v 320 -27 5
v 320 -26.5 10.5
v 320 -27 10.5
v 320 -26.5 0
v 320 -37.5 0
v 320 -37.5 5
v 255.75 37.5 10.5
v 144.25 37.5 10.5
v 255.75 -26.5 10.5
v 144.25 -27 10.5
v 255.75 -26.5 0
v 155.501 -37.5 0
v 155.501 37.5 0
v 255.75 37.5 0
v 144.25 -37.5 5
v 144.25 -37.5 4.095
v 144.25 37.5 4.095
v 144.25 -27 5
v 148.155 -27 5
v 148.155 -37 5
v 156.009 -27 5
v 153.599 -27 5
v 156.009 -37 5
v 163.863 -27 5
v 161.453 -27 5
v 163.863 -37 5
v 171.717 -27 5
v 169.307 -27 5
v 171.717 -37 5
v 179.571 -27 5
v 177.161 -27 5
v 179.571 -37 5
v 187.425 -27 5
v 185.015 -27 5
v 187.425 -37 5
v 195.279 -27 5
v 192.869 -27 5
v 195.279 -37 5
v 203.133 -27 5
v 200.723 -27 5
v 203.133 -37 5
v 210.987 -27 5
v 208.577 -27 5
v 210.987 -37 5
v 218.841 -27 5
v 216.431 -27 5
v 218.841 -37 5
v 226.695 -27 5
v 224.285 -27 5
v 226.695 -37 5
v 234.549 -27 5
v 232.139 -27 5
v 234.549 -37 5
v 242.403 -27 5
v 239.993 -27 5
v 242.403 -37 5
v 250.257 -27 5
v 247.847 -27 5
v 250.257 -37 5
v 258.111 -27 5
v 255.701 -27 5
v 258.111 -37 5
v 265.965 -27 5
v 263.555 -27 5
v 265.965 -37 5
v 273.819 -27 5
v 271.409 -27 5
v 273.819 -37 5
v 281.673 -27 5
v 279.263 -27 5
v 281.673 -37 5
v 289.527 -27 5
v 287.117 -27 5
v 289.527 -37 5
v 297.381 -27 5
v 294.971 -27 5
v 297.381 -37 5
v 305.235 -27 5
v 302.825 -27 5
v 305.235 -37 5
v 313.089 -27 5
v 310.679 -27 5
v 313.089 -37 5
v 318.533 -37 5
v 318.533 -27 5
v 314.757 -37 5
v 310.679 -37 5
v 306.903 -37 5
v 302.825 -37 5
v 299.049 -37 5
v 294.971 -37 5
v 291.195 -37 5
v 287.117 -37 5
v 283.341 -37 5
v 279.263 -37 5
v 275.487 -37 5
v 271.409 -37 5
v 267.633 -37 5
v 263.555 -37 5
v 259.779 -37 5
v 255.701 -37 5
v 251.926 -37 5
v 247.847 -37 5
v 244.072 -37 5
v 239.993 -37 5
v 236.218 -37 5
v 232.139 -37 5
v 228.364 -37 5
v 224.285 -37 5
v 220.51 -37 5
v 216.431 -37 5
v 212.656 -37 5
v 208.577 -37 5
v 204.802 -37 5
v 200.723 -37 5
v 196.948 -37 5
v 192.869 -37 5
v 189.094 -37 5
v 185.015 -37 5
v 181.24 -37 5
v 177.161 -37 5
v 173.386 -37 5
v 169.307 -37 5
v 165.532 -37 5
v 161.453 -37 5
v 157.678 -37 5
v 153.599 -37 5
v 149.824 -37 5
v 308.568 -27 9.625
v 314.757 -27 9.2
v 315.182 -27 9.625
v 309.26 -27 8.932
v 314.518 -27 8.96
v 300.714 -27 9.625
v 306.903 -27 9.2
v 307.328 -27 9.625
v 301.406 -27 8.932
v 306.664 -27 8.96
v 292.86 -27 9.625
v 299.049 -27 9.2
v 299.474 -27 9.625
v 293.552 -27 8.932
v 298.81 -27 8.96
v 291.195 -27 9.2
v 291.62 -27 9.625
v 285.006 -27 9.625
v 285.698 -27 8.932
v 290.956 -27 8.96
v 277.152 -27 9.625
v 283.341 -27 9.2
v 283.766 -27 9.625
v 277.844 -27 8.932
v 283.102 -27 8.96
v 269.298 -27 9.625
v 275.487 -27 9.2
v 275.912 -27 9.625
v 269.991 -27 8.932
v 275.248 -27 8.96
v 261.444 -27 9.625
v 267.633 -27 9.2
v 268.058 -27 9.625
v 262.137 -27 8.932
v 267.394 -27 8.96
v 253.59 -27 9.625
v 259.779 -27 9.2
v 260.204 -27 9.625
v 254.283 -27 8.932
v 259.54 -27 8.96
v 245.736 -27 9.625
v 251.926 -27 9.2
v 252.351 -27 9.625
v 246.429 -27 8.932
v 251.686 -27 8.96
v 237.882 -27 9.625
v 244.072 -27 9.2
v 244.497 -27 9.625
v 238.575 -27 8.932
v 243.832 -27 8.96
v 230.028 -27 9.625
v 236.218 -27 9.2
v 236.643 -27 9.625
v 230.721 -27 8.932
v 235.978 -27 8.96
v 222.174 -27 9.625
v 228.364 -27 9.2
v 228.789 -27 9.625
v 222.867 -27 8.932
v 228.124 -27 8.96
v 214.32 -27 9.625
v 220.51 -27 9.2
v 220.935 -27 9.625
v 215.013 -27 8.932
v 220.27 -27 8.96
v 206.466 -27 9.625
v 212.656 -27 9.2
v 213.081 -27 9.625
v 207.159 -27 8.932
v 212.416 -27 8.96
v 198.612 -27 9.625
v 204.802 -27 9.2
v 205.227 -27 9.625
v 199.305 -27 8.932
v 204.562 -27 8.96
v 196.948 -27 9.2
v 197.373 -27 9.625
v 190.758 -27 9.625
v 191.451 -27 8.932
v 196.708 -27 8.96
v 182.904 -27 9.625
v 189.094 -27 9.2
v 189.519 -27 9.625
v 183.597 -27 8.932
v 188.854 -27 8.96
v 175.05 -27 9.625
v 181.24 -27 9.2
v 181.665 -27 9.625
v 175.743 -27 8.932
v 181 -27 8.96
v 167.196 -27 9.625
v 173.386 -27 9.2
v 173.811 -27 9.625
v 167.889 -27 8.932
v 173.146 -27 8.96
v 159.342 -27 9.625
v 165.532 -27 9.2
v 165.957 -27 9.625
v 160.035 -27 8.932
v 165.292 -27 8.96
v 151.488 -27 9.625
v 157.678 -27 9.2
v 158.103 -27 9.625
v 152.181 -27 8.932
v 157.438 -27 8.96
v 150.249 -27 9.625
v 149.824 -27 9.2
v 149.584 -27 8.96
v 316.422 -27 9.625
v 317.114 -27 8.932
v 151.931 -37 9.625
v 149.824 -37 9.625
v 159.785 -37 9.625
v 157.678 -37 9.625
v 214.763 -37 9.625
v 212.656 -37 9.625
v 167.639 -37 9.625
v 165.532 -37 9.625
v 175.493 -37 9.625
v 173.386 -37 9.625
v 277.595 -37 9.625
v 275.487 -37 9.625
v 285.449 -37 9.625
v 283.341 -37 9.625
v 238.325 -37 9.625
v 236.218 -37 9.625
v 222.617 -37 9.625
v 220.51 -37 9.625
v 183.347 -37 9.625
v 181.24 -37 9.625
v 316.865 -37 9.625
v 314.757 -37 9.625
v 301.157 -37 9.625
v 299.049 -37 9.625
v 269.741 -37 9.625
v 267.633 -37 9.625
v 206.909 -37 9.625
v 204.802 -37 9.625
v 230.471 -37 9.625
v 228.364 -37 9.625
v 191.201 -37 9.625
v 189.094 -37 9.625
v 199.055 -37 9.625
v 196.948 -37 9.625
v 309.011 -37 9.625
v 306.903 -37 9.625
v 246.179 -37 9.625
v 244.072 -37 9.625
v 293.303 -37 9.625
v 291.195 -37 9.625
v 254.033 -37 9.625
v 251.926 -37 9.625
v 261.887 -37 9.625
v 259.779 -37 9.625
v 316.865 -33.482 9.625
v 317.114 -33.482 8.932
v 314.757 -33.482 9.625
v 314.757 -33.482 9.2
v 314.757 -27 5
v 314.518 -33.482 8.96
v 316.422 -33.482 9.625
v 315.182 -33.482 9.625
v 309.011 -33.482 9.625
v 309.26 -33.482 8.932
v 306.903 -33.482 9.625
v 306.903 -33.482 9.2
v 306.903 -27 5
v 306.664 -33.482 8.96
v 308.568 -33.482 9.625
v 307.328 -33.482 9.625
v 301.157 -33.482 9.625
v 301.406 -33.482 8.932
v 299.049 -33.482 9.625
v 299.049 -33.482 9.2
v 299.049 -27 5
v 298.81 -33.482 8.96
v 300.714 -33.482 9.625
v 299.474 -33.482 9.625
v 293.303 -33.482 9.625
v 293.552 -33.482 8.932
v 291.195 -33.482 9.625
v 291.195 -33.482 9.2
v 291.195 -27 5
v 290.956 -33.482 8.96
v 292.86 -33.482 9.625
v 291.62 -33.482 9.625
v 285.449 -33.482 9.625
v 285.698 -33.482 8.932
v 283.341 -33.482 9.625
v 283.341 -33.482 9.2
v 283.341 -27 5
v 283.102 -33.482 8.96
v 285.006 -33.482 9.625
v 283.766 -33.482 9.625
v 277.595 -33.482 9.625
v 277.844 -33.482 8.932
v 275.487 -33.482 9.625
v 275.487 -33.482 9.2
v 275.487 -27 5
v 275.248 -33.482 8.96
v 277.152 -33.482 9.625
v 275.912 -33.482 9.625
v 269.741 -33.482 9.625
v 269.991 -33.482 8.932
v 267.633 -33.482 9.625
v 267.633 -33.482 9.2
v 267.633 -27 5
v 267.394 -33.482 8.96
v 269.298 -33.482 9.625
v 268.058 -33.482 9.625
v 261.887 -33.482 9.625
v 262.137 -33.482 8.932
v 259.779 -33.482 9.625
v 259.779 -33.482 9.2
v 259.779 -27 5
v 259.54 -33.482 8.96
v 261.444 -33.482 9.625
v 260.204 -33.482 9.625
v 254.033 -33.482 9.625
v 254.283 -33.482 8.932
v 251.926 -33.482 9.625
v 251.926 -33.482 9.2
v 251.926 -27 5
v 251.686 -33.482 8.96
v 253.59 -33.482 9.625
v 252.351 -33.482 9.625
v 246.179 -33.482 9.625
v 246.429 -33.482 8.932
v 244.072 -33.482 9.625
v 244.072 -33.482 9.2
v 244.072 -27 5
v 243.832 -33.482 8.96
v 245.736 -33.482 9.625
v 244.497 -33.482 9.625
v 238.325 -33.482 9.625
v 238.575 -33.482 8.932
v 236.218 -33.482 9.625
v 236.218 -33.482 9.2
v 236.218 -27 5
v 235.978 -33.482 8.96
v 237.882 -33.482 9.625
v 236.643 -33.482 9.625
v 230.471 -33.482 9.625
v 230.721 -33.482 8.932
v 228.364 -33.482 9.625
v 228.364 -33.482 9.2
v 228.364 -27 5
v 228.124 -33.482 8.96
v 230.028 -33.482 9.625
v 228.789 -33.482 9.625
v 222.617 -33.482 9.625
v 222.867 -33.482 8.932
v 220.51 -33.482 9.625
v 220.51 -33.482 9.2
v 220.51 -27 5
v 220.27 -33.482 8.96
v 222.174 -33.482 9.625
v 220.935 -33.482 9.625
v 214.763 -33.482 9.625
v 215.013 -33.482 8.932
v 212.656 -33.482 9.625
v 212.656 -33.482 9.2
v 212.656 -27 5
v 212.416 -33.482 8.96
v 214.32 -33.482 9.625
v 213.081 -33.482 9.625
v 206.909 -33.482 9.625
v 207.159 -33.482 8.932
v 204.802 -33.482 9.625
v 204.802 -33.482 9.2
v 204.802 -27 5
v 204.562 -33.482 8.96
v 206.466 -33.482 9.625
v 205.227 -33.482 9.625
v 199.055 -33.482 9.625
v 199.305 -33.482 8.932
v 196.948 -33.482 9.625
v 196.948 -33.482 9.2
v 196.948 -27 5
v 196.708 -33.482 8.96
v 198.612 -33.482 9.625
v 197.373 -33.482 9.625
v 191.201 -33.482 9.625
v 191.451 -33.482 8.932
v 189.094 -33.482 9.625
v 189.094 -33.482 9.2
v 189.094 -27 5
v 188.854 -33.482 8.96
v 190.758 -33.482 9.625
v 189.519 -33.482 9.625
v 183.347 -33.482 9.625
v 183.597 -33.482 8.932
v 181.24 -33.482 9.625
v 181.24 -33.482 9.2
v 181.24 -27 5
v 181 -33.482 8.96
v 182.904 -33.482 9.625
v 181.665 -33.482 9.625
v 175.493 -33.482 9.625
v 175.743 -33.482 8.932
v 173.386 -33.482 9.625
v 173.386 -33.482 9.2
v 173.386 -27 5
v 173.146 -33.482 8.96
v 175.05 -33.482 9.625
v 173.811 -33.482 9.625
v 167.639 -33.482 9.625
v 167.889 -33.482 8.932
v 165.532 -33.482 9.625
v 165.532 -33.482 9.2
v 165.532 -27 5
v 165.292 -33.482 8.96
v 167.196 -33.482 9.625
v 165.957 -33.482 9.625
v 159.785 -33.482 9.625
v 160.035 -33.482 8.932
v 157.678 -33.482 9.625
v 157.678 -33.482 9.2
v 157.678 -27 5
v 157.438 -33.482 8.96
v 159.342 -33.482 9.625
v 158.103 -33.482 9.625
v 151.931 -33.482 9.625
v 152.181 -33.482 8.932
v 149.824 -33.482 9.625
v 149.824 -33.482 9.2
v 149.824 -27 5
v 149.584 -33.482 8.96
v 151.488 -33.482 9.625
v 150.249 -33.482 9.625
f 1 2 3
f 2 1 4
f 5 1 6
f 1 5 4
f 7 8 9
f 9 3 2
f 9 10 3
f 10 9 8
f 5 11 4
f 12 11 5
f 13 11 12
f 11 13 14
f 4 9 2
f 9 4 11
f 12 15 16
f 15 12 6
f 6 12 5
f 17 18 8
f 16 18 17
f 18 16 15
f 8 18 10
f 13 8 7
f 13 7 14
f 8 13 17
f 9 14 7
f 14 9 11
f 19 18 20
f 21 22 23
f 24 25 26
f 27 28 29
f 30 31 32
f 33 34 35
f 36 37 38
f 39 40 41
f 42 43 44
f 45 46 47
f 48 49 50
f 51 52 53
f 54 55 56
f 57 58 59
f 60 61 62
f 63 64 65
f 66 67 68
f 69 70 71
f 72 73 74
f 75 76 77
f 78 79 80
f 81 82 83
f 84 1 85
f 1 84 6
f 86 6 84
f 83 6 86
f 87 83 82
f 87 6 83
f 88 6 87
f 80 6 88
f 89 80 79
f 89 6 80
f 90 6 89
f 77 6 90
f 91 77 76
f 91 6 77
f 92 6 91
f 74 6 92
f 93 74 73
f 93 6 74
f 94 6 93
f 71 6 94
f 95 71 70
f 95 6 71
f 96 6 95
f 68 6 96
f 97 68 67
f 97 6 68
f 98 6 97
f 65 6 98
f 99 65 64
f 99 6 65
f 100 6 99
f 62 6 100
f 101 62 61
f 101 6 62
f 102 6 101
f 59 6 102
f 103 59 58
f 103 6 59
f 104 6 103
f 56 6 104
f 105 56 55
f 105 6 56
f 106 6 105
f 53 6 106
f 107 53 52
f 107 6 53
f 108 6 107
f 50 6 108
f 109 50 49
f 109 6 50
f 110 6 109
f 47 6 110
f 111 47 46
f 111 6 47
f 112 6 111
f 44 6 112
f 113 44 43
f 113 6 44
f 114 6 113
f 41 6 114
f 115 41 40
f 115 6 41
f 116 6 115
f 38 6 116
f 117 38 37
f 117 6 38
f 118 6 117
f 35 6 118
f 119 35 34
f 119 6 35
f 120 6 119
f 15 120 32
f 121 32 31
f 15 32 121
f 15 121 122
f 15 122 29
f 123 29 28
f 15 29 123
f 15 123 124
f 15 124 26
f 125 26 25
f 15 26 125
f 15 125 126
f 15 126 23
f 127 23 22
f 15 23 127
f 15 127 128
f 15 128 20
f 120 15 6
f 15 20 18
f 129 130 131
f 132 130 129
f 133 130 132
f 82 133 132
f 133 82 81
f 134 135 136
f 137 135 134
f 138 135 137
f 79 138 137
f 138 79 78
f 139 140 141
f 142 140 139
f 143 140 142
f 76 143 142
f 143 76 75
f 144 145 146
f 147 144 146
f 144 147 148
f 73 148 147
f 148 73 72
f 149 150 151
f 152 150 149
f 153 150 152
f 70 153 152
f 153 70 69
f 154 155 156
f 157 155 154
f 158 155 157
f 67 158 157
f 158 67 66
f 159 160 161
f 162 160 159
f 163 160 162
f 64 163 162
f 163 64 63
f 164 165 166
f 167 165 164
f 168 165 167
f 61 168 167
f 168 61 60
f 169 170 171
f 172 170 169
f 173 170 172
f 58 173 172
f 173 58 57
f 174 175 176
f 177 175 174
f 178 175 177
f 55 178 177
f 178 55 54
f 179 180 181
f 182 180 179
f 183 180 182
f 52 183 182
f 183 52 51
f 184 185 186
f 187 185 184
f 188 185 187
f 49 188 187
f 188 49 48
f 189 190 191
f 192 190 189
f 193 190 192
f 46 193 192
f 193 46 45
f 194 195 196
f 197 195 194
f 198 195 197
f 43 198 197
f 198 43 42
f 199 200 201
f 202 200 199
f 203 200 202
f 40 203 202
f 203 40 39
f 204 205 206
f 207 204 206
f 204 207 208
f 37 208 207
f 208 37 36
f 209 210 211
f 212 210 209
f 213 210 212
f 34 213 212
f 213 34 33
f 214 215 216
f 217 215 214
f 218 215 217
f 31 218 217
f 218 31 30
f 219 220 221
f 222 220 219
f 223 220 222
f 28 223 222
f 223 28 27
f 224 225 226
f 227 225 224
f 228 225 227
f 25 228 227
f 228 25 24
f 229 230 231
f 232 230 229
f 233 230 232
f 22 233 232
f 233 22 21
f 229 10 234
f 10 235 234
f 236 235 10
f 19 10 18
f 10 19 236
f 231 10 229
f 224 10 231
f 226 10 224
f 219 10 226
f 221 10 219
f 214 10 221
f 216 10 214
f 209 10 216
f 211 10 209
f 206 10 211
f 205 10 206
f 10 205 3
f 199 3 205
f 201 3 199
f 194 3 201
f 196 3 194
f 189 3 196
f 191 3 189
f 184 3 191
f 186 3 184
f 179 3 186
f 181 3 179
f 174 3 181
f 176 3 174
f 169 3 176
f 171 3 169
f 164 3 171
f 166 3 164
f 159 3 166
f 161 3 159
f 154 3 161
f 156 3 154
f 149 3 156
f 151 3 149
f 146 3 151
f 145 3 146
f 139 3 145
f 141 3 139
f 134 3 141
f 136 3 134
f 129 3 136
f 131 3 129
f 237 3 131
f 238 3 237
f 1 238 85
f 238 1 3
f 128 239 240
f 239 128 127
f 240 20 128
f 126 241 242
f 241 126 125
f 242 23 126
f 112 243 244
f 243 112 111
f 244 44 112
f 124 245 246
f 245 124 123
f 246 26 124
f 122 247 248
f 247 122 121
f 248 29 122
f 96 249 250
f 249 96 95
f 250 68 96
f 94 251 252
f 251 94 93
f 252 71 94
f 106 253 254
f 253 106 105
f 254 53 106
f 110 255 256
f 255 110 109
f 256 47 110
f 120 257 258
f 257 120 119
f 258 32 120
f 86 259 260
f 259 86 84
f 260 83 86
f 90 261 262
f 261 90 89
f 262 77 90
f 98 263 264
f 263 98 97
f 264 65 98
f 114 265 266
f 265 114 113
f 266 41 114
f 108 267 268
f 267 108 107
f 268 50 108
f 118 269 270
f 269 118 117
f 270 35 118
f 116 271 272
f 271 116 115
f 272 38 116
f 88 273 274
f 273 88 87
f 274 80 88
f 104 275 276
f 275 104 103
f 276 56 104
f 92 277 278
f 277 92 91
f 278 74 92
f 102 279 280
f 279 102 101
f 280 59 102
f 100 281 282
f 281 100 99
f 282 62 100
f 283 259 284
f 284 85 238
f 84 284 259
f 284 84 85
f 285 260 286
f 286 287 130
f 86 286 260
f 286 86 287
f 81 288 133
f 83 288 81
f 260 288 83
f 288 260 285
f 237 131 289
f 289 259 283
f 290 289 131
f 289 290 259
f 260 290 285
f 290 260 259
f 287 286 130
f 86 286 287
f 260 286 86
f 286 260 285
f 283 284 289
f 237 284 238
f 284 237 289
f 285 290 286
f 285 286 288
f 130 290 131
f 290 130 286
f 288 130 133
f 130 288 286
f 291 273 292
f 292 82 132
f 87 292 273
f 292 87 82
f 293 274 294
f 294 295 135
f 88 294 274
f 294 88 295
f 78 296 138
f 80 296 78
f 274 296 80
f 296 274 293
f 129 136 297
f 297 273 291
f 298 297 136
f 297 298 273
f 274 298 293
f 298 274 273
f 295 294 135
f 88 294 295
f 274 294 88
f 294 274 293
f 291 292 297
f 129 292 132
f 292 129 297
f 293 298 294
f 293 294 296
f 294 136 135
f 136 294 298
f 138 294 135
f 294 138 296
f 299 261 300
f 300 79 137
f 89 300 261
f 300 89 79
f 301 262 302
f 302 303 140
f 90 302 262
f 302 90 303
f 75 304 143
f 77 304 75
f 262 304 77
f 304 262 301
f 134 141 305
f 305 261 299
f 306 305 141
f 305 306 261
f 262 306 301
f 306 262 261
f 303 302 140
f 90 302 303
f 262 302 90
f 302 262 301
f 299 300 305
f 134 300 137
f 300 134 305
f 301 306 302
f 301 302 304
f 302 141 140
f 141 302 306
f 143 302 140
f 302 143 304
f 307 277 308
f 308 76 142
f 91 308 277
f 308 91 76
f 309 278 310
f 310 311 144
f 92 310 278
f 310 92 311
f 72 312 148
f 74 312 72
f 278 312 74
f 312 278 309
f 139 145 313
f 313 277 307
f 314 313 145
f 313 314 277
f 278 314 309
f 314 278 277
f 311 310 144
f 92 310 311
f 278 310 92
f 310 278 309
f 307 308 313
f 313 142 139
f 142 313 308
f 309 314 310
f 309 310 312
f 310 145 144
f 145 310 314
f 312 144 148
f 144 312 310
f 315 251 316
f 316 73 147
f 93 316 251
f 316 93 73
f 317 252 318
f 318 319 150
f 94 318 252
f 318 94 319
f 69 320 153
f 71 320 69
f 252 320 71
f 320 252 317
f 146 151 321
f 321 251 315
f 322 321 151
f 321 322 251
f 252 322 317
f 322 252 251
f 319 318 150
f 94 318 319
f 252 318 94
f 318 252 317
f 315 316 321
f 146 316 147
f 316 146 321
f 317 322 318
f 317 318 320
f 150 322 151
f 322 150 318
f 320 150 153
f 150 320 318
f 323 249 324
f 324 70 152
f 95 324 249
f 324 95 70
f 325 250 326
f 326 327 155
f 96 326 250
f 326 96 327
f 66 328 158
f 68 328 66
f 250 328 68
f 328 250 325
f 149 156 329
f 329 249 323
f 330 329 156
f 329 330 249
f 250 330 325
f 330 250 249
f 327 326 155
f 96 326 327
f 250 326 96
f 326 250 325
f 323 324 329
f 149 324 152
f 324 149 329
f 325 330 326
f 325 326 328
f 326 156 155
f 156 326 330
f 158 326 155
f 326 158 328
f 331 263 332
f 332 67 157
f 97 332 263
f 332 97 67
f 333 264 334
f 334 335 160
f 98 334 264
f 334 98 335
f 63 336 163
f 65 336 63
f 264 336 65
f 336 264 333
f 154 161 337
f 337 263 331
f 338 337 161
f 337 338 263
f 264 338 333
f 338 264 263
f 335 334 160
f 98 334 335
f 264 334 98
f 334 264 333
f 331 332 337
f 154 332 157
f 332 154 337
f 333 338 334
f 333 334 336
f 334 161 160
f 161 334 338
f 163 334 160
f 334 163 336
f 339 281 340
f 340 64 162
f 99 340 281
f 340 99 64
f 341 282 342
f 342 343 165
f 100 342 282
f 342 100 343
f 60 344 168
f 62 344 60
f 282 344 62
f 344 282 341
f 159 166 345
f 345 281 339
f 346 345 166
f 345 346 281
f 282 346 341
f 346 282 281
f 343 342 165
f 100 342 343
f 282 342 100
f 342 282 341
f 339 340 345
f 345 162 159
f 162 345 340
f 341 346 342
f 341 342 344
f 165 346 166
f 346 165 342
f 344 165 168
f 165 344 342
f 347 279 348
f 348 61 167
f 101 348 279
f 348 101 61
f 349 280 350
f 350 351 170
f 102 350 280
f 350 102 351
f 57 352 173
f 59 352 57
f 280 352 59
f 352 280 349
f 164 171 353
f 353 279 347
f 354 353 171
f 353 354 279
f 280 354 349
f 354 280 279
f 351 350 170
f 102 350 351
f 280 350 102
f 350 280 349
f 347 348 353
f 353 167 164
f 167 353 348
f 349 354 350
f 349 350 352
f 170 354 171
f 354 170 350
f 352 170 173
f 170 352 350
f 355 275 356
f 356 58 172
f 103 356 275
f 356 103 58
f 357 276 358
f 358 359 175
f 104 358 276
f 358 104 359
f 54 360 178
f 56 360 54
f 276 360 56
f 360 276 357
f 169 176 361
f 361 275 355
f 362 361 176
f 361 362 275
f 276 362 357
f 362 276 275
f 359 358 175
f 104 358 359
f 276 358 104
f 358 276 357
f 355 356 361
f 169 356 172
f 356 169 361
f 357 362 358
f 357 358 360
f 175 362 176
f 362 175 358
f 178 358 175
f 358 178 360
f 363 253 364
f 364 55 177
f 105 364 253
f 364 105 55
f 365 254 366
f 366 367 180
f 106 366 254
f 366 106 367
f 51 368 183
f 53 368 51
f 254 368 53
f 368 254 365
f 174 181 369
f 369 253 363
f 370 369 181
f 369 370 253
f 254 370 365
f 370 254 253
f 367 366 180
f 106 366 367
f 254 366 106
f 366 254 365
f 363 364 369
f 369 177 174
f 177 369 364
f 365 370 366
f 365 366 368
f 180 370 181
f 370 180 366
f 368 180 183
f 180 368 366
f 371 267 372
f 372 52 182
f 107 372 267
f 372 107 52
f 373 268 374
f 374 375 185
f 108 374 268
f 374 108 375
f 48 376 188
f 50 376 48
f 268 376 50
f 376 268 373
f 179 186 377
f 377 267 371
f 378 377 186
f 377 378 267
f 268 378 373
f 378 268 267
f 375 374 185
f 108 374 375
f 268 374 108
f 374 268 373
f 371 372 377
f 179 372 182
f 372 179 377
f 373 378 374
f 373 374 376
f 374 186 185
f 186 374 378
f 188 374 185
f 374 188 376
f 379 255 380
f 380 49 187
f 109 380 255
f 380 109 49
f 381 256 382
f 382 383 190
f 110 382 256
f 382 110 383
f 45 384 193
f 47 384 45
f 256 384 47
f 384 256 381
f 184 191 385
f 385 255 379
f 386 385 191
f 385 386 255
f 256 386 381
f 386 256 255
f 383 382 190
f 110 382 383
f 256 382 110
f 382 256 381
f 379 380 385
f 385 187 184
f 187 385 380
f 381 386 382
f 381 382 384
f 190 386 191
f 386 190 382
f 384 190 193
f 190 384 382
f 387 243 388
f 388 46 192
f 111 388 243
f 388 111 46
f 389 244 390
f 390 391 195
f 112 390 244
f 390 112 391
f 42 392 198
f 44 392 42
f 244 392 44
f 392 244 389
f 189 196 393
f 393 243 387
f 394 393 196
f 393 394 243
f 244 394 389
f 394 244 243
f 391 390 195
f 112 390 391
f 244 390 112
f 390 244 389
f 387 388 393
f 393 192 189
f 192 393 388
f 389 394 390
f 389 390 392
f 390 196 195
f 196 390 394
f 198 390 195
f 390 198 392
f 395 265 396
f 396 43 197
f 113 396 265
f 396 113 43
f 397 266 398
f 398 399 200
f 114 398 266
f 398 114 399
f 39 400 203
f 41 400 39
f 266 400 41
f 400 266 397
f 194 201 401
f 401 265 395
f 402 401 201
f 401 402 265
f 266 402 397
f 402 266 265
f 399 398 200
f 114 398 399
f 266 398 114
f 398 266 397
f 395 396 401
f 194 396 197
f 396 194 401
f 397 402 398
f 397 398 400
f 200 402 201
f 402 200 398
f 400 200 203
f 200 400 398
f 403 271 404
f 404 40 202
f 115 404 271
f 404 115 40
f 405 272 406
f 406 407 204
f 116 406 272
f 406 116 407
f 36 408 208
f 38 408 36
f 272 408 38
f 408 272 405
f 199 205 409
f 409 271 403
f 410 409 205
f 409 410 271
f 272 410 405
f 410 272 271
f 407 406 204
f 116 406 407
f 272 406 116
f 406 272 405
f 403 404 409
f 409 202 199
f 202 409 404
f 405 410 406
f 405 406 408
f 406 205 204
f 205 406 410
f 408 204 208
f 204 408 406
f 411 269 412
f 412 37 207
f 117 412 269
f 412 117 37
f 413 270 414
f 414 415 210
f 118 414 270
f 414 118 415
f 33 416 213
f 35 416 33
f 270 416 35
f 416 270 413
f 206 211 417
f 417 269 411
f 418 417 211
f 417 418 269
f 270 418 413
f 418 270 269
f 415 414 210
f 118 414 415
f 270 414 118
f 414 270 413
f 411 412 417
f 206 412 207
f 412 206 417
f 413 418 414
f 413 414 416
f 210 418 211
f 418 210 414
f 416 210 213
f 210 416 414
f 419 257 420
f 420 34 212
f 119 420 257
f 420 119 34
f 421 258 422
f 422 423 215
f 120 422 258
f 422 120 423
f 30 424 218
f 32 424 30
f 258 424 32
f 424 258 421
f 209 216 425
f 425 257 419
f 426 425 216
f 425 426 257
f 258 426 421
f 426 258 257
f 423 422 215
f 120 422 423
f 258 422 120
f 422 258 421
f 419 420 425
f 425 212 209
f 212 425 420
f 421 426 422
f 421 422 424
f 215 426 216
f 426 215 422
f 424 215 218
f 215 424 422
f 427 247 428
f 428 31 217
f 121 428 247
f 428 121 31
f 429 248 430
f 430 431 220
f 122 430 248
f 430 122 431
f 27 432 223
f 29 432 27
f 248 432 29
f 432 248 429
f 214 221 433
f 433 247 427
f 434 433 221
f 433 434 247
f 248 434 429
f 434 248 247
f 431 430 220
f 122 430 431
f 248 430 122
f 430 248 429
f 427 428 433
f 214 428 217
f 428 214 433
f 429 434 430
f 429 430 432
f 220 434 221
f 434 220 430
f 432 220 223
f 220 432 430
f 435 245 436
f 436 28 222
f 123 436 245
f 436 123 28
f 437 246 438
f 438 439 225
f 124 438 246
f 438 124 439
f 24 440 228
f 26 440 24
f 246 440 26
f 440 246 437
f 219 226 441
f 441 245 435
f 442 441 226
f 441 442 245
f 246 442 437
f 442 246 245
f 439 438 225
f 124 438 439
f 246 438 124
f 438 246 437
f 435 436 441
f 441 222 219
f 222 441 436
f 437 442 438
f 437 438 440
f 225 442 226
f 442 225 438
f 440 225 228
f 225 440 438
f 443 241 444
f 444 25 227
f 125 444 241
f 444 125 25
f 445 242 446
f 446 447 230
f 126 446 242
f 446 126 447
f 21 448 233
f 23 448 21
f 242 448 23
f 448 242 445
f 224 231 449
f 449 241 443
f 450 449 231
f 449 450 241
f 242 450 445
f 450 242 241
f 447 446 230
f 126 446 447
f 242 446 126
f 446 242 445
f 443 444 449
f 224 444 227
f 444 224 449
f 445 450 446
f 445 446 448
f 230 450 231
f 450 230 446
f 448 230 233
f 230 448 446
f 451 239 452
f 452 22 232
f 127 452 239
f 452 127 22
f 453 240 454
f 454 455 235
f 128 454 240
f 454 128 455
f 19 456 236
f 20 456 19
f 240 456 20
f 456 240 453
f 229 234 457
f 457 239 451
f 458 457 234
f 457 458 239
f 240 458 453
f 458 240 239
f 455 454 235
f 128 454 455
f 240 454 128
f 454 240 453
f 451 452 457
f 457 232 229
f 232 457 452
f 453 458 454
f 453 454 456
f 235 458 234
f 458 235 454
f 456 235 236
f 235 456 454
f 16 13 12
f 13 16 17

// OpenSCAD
/*
   Copyright 2017 Alan Steremberg
*/
// configuration

$fn=100;

boxWidth=75;
boxHeight=75;
boxThickness=10.5;

coinDiameter = boxHeight;
coinThickness= boxThickness;
//pipeRadius = 24.25; // black pipe
//pipeRadius = 21.40; // clear pipe
//insidePipeRadius=20.8;
insidePipeRadius=coinDiameter/2+1;
wallThickness = 2.5;
screwDiameter = 4.8;
screwRadius=screwDiameter/2;
holeOffset = 35;
flangeWidth = 90;
flangeHeight= 130;
servoPusherHoleDiameter=1.75;




// BEFORE

pi = 3.1415926535897932384626433832795;
debug = false;

module tooth(mod,width) {
	// see http://easycalculation.com/trigonometry/triangle-angles.php
	opposite_at_reference_pitch=mod / tan(70);
	if (debug) echo("Opposite at reference pitch: ", opposite_at_reference_pitch);
	// see http://www.metrication.com/engineering/gears.html
	// see section Circular Tooth Thickness
	// see also http://www.tech.plym.ac.uk/sme/desnotes/gears/nomen1.htm
	tooth_width_at_reference_pitch=(pi / 2) * mod;
	if (debug) echo("Tooth width at reference_pitch: ", tooth_width_at_reference_pitch);
	cube_width = tooth_width_at_reference_pitch - (2 * opposite_at_reference_pitch);
	if (debug) echo("Cube width: ", cube_width);
	// see http://www.metrication.com/engineering/gears.html
	// see section Whole Depth
	opposite_of_triangle = mod < 1.25 ? 2.4 * mod : 2.25 * mod;
	if (debug) echo("Opposite_of_triangle: ", opposite_of_triangle);
	// see http://easycalculation.com/trigonometry/triangle-angles.php
	adjacent_of_triangle = opposite_of_triangle / tan(70);
	if (debug) echo("Adjacent of triangle: ", adjacent_of_triangle);
	diagonal = sqrt((opposite_of_triangle + 0.05) * (opposite_of_triangle + 0.05) + (adjacent_of_triangle * adjacent_of_triangle));
	correct_angle = 90 - acos(adjacent_of_triangle / diagonal);
	if (debug) echo("Correct angle: ", correct_angle);
	adjacent_of_mini_triangle = 0.05 / tan(90 - correct_angle);
	if (debug) echo("Adjacent of mini triangle: ", adjacent_of_mini_triangle);
	adjacent_top_cube = (0.5 * mod) / tan(45);
	translate([0,adjacent_of_mini_triangle * -1, 0]) {
		difference() {
			union() {
				intersection() {
					cube([opposite_of_triangle + 0.05,adjacent_of_triangle, width]);
					rotate([0,0,correct_angle]) cube([diagonal,adjacent_of_triangle, width]);
				}
				translate([0,adjacent_of_triangle,0]) cube([opposite_of_triangle + 0.05,cube_width, width]);
				translate([0,(adjacent_of_triangle * 2) + cube_width,width]) {
					rotate([180,0,0]) {
						intersection() {
							cube([opposite_of_triangle + 0.05,adjacent_of_triangle, width]);
							rotate([0,0,correct_angle]) cube([diagonal,adjacent_of_triangle, width]);
						}
					}
				}
			}
			translate([-0.5 * mod,-1,-0.5 * mod])cube([1 * mod + 0.05, 1+ adjacent_of_mini_triangle, width + (1 * mod)]);
			translate([-0.5 * mod,(adjacent_of_triangle * 2) + cube_width - adjacent_of_mini_triangle,-0.5 * mod]) cube([1 * mod + 0.05, 1, width + (1 * mod)]);
			translate([opposite_of_triangle + 0.05 * mod,adjacent_of_triangle - adjacent_top_cube,-0.25 * mod]) {
				rotate([0,0,45]) cube([1 * mod, 0.5 * mod,cube_width + (2 * mod)]);
			}
			translate([opposite_of_triangle + 0.05 * mod,adjacent_of_triangle - adjacent_top_cube + cube_width + 0.3 * mod,-0.25 * mod]) {
				rotate([0,0,45]) cube([0.5 * mod, 1 * mod,cube_width + (2 * mod)]);
			}
		}
	}
}

module teeth(mod,number_of_teeth,width) {
	union() {
		for (i= [0:number_of_teeth - 1]) {
			// see http://www.tech.plym.ac.uk/sme/desnotes/gears/nomen1.htm
			translate([-0.05,i * mod * pi,0]) {
				tooth(mod=mod,width=width);	
			}
		}
	}
}

module gear_rack(mod,number_of_teeth,rack_width,rack_bottom_height) {
	total_rack_length = number_of_teeth * pi * mod;
	rotate([0,90,0]) {
		translate([0,total_rack_length / 2 * -1,rack_width / 2 * -1]) {
			union() {
				teeth(mod=mod,number_of_teeth=number_of_teeth,width=rack_width);
				translate([rack_bottom_height * -1,0,0])
					cube([rack_bottom_height, number_of_teeth * pi * mod, rack_width]);
			}
		}
	}
	echo("Total length of gear rack (in mm): ", total_rack_length);
}


module holder(
   top_gap=4,
   side_gap=10,
   servo_width=20, 
   servo_length=42.5,
   gear_radius=17.8,
   servo_mount=4,
   rack_bottom_height=3.3,
   channel=9,
   tray_thickness=5.8
) {
    length=side_gap*2+servo_length;
    width=top_gap+servo_width/2+rack_bottom_height+gear_radius+tray_thickness;
    woffset=tray_thickness/2+rack_bottom_height/2;
difference(){
    
    cube([length, width, servo_mount],center=true);
    echo("woffset:",woffset);
    translate([0,woffset,0]) cube([servo_length,servo_width, servo_mount],center=true);
    }
    translate([0,-width/2+1,4])cube([length,2,servo_mount],center=true);
}


/// AFTER













//
// The pusher is the part that pushes coins out. It has a handle, and hole to hook
// a wire, that is hooked to the servo horn
//


module pusher(length){
    difference()
    {
    union(){
    difference() {
    union() {
         // cube to hold teeth
         translate([70,-21-11,coinThickness/2]) cube([100,11,coinThickness],center=true);
        // main cube
        linear_extrude(coinThickness){
            square([length,coinDiameter],true);
        }
   }

     // remove a spot for the teeth
     translate ([-80,-27-11,5]) cube([200,11,15]);
  }
       //teeth
       translate([32.5,-21-11,4]) rotate([0,180,90]) gear_rack(mod=2.5,number_of_teeth=22,rack_width=10,rack_bottom_height=3);
   }
     // remove a slant at the front
     translate([-75+15,-35-5,-5]) rotate([0,20,0])color("yellow") cube([25,122,10]);
}
}


//
//  The flange is the part that hooks a pipe to a flat piece that we can bolt
//  to the tray.  The bolt holes are in a separate module.
//

module flange(){
  h = 3.5;
 
  difference(){
     difference() {
        // the basic shape is a cube with a cylinder tacked onto it
       union(){
        cube([flangeWidth,flangeHeight,h],center=true);
        translate([0,0,8])
            //cylinder(r=26.5, h=h+10, center=true);
            cube([boxHeight+10,boxWidth+10,h+10],center=true);

       }
       // remove the hole the pipe fits in - it doesn't go all the way through, so the
       // pipe can sit on a "shelf"
       translate([0,0,h+9])
//	      cylinder(r=pipeRadius, h=h+20, center=true);
            cube([boxHeight+7,boxWidth+7,h+20],center=true);

     }
    // remove the hole the coin will fall through
     cube([boxHeight,boxWidth,h+30],center=true);
//	cylinder(r=insidePipeRadius, h=h+30, center=true);
   }
}


// The tray is a simple shape composed of a bunch of different cubes to hook everything to
//  some of the mounting holes (that hook to the flange) are in another module
module tray()
{

// Tray
 difference(){
   cube([coinDiameter+wallThickness*2,length+40,wallThickness+coinThickness],center=true);
    translate([0,+5,wallThickness/2]) cube([insidePipeRadius*2,length+50,coinThickness],center=true);
 }

// Supports that match up with flange
supportHeight = (coinThickness+wallThickness)/2-wallThickness/2;
supportWidth = 40-(coinDiameter+wallThickness*2)/2;
offset = coinDiameter/2+wallThickness+supportWidth/2;
translate([offset,length/2-20,0])cube([supportWidth,80,wallThickness+coinThickness],center=true);
translate([-(offset),length/2-20,0])cube([supportWidth,80,wallThickness+coinThickness],center=true);

// another leg to put a screw in
//translate([offset,-(length/2-10),0])cube([supportWidth,20,wallThickness+coinThickness],center=true);

// servo holder
    servoHolderLength=120-40;
 
    difference(){
     color("green") translate([-(offset+5),-(length/2-20),0])cube([supportWidth+10,servoHolderLength,   wallThickness+coinThickness],center=true);
        union(){
        color("blue") translate([-36.5-6,-25,0]) cylinder(r=screwRadius,h=20,center=true);
        color("blue") translate([-36.5-6,-124+75-25,0]) cylinder(r=screwRadius,h=20,center=true);
        }
    }

 if (False)
 difference() {

difference(){
    color("green") translate([-(offset+5),-(length/2)-20,0])cube([supportWidth+10,servoHolderLength,   wallThickness+coinThickness],center=true);
// servo hole - 40.75
    servoLength = 40.75;
    servoWidth=21.5;
    translate([-(offset+1),-(length/2+50),0])cube([servoWidth,servoLength,coinThickness+wallThickness+10],center=true);
   }
   // subtract out the base
      translate([-(offset+5),-(length/2)+20,wallThickness])cube([supportWidth+10,servoHolderLength-70,   wallThickness+coinThickness],center=true);
}
}


// this subtracts holes from the flange
module holeFlange()
{
       difference() {
          flange();
          union() {
            translate([holeOffset,-holeOffset,0]) cylinder(r=screwRadius,h=20, center=true);
            translate([holeOffset,holeOffset,0]) cylinder(r=screwRadius,h=20,center=true);
            translate([-holeOffset,-holeOffset,0]) cylinder(r=screwRadius,h=20,center=true);
            translate([-holeOffset,holeOffset,0]) cylinder(r=screwRadius,h=20,center=true);
           }
       }
}

module holeTray()
{
  //subtract the holes from the tray
  difference() {
      

    tray();
    union() {
      //servo holes
      translate([-28.5-4,-75-15,0]) cylinder(r=screwRadius,h=20,center=true);
      translate([-36.5-4,-75-15,0]) cylinder(r=screwRadius,h=20,center=true);
      translate([-28.5-4,-124-15,0]) cylinder(r=screwRadius,h=20,center=true);
      translate([-36.5-4,-124-15,0]) cylinder(r=screwRadius,h=20,center=true);

      // holes to match up with the flange
      translate([0,length/2-20,0]) union(){
       translate([holeOffset,-holeOffset,0]) cylinder(r=screwRadius,h=20,center=true);
       translate([holeOffset,holeOffset,0]) cylinder(r=screwRadius,h=20,center=true);
       translate([-holeOffset,-holeOffset,0]) cylinder(r=screwRadius,h=20,center=true);
       translate([-holeOffset,holeOffset,0]) cylinder(r=screwRadius,h=20,center=true);
      }
    }
    
    
    // mounting holes
      translate([-35,-60,0]) cylinder(r=screwRadius,h=20,center=true);
     // translate([31,-40,0]) cylinder(r=screwRadius,h=20,center=true);
    
  }
}

module servoHolder(
   top_gap=4+4+12,
   side_gap=10,
   servo_width=20+15+12, 
   servo_length=42.5,
   gear_radius=17.8,
   servo_mount=4,
   rack_bottom_height=3.3,
   channel=9,
   tray_thickness=5.8
) {
    length=side_gap*2+servo_length;
    width=top_gap+servo_width/2+rack_bottom_height+gear_radius+tray_thickness;
    woffset=tray_thickness/2+rack_bottom_height/2;
difference(){
    
    cube([length, width, servo_mount],center=true);
    echo("woffset:",woffset);
    translate([0,woffset,0]) cube([servo_length,servo_width, servo_mount+5],center=true);
    }
    union(){
    translate([0,-width/2+2.5,14])cube([length,5,servo_mount+20],center=true);


    }
}

module servoHolderHoles(){
    difference(){
        rotate([90,0,270]) servoHolder();
        union(){
      //translate([30-28.5-4,-15+40,-30]) cylinder(r=screwRadius,h=50,center=true);
      translate([30-36.5+2,-15+40,-30]) cylinder(r=screwRadius,h=50,center=true);
      translate([30-36.5-5,-15+40,-30]) cube([10+2,screwRadius*2,50],center=true);       
      translate([30-36.5-10,-15+40,-30]) cylinder(r=screwRadius,h=50,center=true);
     // translate([30-28.5-4,-124+75+40-15,-30]) cylinder(r=screwRadius,h=50,center=true);
      translate([30-36.5+2,-124+75-15+40,-30]) cylinder(r=screwRadius,h=50,center=true);
      translate([30-36.5-5,-124+75-15+40,-30]) cube([10+2,screwRadius*2,50],center=true);
      translate([30-36.5-10,-124+75-15+40,-30]) cylinder(r=screwRadius,h=50,center=true);
    rotate([0,90,0])translate([8,0,20])color("red") union(){
      //slot 1 - servo screws
      translate([30-36.5+7.5+7.5,-15+40,-30]) cylinder(r=screwRadius,h=50,center=true);
      translate([30-36.5-6,-15+40,-30]) cube([11+15+15,screwRadius*2,50],center=true);       
      translate([30-36.5-12-7.5-7.5,-15+40,-30]) cylinder(r=screwRadius,h=50,center=true);
      // slot 2
      translate([30-36.5+7.5+7.5,-125+75-15+40,-30]) cylinder(r=screwRadius,h=50,center=true);
      translate([30-36.5-6,-125+75-15+40,-30]) cube([11+15+15,screwRadius*2,50],center=true);       
      translate([30-36.5-12-7.5-7.5,-125+75-15+40,-30]) cylinder(r=screwRadius,h=50,center=true);
    }

        }
    }
    

    
    
}

module  dowelFlange2(){
  h = 3.5;
 
  dowelRadius=8.75/2;
  dowelHolderRadius=dowelRadius+2;
    

  difference(){

     difference() {
        // the basic shape is a cube with a cylinder tacked onto it
       union(){
           cube([flangeWidth,flangeHeight,h],center=true);
           
             translate([boxHeight/2+dowelHolderRadius/2,boxWidth/2+dowelHolderRadius/2,8]) cylinder(r=dowelHolderRadius, h=14, center=true);
             translate([-(boxHeight/2+dowelHolderRadius/2),boxWidth/2+dowelHolderRadius/2,8]) cylinder(r=dowelHolderRadius, h=14, center=true);

             dowelRadius2=13.25/2;
            dowelHolderRadius2=dowelRadius2+2;

             translate([boxHeight/2+dowelHolderRadius2/2,-(boxWidth/2+dowelHolderRadius2/2),8]) cylinder(r=dowelHolderRadius2, h=14, center=true);
             translate([-(boxHeight/2+dowelHolderRadius2/2),-(boxWidth/2+dowelHolderRadius2/2),8]) cylinder(r=dowelHolderRadius2, h=14, center=true);

       }
union(){
      dowelRadius=8.75/2;
  dowelHolderRadius=dowelRadius+2;

              translate([boxHeight/2+dowelRadius/2,boxWidth/2+dowelRadius/2,8]) cylinder(r=dowelRadius, h=h+20, center=true);
              translate([-(boxHeight/2+dowelRadius/2),boxWidth/2+dowelRadius/2,8]) cylinder(r=dowelRadius, h=h+20, center=true);
                 dowelRadius2=13.25/2;
            dowelHolderRadius2=dowelRadius2+2;

          translate([boxHeight/2+dowelRadius2/2,-(boxWidth/2+dowelRadius2/2),8]) cylinder(r=dowelRadius2, h=h+20, center=true);
          translate([-(boxHeight/2+dowelRadius2/2),-(boxWidth/2+dowelRadius2/2),8]) cylinder(r=dowelRadius2, h=h+20, center=true);

}

     }
    // remove the hole the coin will fall through
     cube([boxHeight,boxWidth,h+30],center=true);
//	cylinder(r=insidePipeRadius, h=h+30, center=true);
   }
}

module  dowelFlange(){
  h = 3.5;
 
  dowelRadius=8.75/2;
  dowelHolderRadius=dowelRadius+2;
  dowelRadius2=13.25/2;
  dowelHolderRadius2=dowelRadius2+2;
    

  difference(){

     difference() {
        // the basic shape is a cube with a cylinder tacked onto it
       union(){
           cube([flangeWidth,flangeHeight,h],center=true);
           

           
             translate([0,boxWidth/2+dowelHolderRadius,8]) cylinder(r=dowelHolderRadius, h=14, center=true);
             translate([boxHeight/2+dowelHolderRadius2,0,8]) cylinder(r=dowelHolderRadius2, h=14, center=true);
           
           

             translate([0,-(boxWidth/2+dowelHolderRadius),8]) cylinder(r=dowelHolderRadius, h=14, center=true);
             translate([-(boxHeight/2+dowelHolderRadius2),0,8]) cylinder(r=dowelHolderRadius2, h=14, center=true);
           


       }
union(){

          translate([0,boxWidth/2+dowelRadius,8]) cylinder(r=dowelRadius, h=h+20, center=true);
          translate([-(boxHeight/2+dowelRadius2),0,8]) cylinder(r=dowelRadius2, h=h+20, center=true);
          translate([0,-(boxWidth/2+dowelRadius),8]) cylinder(r=dowelRadius, h=h+20, center=true);
          translate([(boxHeight/2+dowelRadius2),0,8]) cylinder(r=dowelRadius2, h=h+20, center=true);

}

     }
    // remove the hole the coin will fall through
     cube([boxHeight,boxWidth,h+30],center=true);
//	cylinder(r=insidePipeRadius, h=h+30, center=true);
   }
}


// this subtracts holes from the flange
module holeDowelFlange()
{
       difference() {
          dowelFlange();
          union() {
            translate([holeOffset,-holeOffset,0]) cylinder(r=screwRadius,h=20, center=true);
            translate([holeOffset,holeOffset,0]) cylinder(r=screwRadius,h=20,center=true);
            translate([-holeOffset,-holeOffset,0]) cylinder(r=screwRadius,h=20,center=true);
            translate([-holeOffset,holeOffset,0]) cylinder(r=screwRadius,h=20,center=true);
           }
       }
}

module pusherBracket(length)
{
    difference() {
        union() {
    cube([30,coinDiameter+(coinDiameter/5*2+2),coinThickness],center=true);
    translate([0,coinDiameter/2+(coinDiameter/5/2)+1,coinThickness])cube([30,coinDiameter/5,coinThickness+3],center=true);
    translate([0,-(coinDiameter/2+(coinDiameter/5/2)+1),coinThickness])cube([30,coinDiameter/5,coinThickness+3],center=true);
        }
        union(){
    translate([0,-(coinDiameter/2+(coinDiameter/5/2)+1),coinThickness]) cylinder(r=screwRadius,h=40, center=true);
    translate([0,(coinDiameter/2+(coinDiameter/5/2)+1),coinThickness]) cylinder(r=screwRadius,h=40, center=true);
        }
    }
}


//length=150;
length = boxWidth+15.5+21;

//color("green") translate([150,0,0]) pusherBracket(length);
color("blue")  translate([200,0,0]) pusher(length);
//color("red")  translate([0,length/2-20,10])holeFlange();
//color("orange") translate([-30,-length/2-20-28,25]) servoHolderHoles();
//color("orange") translate([-32,-length/2+16,25]) servoHolderHoles();
//holeTray();
//color("red")  translate([0,length/2-20,10])holeDowelFlange();

// todo - flange with supports for dowels
// todo - servo holder, make it taller so we can adjust on two axis - and fix problems easily - no washers needed
